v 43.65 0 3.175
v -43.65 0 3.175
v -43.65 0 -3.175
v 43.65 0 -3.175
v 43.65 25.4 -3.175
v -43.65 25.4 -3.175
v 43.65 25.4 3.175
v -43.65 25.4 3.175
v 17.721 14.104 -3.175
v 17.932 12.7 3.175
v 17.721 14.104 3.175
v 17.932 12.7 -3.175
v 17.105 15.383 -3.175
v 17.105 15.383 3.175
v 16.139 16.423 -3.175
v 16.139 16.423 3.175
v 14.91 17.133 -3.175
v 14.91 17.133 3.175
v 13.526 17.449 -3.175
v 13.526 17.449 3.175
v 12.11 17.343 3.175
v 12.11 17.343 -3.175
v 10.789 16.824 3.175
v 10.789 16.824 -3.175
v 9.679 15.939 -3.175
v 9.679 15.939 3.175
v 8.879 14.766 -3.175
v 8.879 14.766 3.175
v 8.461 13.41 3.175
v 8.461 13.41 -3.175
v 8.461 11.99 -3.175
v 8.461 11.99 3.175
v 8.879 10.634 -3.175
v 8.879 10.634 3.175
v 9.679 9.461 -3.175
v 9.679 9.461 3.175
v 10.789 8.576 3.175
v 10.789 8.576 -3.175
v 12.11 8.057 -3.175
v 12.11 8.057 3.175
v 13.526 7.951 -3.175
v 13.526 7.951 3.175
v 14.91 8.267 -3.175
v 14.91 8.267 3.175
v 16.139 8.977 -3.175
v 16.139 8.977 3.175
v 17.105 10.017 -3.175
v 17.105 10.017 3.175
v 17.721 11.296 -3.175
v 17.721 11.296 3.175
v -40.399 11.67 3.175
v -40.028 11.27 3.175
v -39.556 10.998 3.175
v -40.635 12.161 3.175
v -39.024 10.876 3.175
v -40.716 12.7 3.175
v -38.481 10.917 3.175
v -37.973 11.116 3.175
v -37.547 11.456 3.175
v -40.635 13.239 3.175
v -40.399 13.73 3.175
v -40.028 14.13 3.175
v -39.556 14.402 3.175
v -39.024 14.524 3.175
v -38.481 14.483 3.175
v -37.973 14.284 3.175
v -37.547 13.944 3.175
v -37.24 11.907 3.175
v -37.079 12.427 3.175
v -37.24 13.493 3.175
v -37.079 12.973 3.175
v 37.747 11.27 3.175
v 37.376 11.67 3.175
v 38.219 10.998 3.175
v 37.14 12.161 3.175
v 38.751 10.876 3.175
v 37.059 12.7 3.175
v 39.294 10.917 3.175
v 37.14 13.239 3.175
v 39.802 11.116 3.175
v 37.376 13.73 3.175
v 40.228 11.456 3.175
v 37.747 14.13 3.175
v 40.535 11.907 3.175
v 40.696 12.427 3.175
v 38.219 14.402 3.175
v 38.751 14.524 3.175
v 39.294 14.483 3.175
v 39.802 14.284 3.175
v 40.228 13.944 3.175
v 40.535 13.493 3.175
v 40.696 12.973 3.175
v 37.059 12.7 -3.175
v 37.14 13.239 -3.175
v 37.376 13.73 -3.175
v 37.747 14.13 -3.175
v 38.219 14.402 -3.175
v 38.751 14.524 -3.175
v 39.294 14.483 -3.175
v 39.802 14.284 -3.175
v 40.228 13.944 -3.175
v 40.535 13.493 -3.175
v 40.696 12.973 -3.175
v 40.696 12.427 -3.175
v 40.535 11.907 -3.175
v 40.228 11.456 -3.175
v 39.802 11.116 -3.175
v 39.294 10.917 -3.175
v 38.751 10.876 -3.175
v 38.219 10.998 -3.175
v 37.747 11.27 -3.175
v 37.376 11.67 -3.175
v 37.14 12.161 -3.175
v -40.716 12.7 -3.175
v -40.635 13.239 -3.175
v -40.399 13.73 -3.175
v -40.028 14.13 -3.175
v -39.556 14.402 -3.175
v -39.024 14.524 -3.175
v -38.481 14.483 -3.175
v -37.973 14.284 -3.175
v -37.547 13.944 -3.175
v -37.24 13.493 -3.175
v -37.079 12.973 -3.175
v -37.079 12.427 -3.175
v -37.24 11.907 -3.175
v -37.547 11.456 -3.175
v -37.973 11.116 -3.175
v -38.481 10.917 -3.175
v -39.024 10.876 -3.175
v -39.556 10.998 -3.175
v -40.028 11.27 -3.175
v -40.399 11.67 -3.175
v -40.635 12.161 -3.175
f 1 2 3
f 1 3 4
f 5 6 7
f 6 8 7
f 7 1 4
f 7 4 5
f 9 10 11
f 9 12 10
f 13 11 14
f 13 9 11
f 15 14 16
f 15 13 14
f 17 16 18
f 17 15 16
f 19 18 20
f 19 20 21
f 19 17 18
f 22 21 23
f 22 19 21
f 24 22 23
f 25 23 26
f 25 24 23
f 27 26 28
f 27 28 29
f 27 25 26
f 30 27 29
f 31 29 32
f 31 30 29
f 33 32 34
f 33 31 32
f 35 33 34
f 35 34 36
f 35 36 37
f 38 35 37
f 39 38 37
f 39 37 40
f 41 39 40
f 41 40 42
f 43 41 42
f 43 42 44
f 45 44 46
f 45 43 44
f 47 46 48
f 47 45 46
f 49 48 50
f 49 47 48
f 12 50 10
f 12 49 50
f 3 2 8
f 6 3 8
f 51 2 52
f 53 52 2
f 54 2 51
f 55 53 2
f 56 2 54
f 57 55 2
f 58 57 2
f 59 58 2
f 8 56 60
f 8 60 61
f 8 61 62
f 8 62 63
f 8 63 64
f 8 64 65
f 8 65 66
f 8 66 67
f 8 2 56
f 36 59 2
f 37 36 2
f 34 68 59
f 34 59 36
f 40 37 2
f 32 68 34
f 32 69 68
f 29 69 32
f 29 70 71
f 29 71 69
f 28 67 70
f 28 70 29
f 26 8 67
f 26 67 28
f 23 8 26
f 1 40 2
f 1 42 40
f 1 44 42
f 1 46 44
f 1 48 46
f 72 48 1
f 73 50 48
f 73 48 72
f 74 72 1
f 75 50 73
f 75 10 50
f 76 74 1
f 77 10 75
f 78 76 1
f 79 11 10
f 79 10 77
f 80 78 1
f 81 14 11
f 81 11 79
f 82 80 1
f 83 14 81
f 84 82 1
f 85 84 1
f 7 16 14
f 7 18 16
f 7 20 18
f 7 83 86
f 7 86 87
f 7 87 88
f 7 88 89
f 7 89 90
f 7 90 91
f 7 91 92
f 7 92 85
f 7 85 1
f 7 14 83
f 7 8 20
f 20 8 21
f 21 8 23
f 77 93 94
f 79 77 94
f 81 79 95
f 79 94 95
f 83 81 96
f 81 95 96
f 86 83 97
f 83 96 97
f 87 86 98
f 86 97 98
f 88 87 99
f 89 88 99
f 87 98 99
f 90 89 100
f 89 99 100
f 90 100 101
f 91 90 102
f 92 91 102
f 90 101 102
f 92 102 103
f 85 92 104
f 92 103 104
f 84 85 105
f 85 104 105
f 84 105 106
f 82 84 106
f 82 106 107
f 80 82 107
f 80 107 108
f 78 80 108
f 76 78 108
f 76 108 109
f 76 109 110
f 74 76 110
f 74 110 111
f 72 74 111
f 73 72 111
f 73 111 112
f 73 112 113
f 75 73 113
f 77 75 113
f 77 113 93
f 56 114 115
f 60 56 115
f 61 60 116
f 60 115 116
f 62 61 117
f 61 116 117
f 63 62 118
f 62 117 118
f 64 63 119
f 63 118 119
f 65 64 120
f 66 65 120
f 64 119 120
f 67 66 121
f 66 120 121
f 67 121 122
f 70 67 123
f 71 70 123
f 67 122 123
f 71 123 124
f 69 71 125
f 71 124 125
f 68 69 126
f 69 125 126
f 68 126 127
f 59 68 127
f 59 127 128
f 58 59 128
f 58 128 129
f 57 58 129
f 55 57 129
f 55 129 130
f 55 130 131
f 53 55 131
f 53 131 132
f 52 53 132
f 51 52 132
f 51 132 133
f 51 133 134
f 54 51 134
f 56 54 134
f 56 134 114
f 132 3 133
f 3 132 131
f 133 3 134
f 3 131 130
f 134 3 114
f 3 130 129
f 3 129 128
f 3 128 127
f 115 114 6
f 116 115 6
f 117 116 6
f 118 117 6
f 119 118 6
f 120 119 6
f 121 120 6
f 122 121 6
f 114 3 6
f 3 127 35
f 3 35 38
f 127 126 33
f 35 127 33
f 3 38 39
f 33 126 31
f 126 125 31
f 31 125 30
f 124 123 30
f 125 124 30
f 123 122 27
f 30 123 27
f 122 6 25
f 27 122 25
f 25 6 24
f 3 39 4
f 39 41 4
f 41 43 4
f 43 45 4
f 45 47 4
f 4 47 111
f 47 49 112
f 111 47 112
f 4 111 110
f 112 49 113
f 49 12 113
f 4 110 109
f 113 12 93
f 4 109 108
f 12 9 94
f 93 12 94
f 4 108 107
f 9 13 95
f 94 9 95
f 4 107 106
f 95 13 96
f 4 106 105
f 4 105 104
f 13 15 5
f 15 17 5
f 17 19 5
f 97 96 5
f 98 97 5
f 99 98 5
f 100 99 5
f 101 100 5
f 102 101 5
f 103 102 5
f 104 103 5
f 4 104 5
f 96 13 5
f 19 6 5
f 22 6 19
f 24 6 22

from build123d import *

# Parameters (mm, degrees)
SKETCH1_W             = 87.3
SKETCH1_H             = 25.4
SKETCH1_R             = 4.7625
BOSS_EXTRUDE1_DEPTH   = 3.175
F_6_CLEARANCE_HOLE1_D = 3.6576


with BuildPart() as part:
    # Sketch1 → Boss-Extrude1 (new, symmetric)
    with BuildSketch(Plane.XY):
        with Locations((0, 12.7)):
            Rectangle(SKETCH1_W, SKETCH1_H)
        with Locations((13.17, 12.7)):
            Circle(SKETCH1_R, mode=Mode.SUBTRACT)
    extrude(amount=BOSS_EXTRUDE1_DEPTH, both=True)

    # #6 Clearance Hole1 (through all)
    with Locations(Plane.XY.offset(3.175)):
        with Locations((-38.8875, 12.7), (38.8875, 12.7)):
            Hole(F_6_CLEARANCE_HOLE1_D / 2)


solid = part.part
